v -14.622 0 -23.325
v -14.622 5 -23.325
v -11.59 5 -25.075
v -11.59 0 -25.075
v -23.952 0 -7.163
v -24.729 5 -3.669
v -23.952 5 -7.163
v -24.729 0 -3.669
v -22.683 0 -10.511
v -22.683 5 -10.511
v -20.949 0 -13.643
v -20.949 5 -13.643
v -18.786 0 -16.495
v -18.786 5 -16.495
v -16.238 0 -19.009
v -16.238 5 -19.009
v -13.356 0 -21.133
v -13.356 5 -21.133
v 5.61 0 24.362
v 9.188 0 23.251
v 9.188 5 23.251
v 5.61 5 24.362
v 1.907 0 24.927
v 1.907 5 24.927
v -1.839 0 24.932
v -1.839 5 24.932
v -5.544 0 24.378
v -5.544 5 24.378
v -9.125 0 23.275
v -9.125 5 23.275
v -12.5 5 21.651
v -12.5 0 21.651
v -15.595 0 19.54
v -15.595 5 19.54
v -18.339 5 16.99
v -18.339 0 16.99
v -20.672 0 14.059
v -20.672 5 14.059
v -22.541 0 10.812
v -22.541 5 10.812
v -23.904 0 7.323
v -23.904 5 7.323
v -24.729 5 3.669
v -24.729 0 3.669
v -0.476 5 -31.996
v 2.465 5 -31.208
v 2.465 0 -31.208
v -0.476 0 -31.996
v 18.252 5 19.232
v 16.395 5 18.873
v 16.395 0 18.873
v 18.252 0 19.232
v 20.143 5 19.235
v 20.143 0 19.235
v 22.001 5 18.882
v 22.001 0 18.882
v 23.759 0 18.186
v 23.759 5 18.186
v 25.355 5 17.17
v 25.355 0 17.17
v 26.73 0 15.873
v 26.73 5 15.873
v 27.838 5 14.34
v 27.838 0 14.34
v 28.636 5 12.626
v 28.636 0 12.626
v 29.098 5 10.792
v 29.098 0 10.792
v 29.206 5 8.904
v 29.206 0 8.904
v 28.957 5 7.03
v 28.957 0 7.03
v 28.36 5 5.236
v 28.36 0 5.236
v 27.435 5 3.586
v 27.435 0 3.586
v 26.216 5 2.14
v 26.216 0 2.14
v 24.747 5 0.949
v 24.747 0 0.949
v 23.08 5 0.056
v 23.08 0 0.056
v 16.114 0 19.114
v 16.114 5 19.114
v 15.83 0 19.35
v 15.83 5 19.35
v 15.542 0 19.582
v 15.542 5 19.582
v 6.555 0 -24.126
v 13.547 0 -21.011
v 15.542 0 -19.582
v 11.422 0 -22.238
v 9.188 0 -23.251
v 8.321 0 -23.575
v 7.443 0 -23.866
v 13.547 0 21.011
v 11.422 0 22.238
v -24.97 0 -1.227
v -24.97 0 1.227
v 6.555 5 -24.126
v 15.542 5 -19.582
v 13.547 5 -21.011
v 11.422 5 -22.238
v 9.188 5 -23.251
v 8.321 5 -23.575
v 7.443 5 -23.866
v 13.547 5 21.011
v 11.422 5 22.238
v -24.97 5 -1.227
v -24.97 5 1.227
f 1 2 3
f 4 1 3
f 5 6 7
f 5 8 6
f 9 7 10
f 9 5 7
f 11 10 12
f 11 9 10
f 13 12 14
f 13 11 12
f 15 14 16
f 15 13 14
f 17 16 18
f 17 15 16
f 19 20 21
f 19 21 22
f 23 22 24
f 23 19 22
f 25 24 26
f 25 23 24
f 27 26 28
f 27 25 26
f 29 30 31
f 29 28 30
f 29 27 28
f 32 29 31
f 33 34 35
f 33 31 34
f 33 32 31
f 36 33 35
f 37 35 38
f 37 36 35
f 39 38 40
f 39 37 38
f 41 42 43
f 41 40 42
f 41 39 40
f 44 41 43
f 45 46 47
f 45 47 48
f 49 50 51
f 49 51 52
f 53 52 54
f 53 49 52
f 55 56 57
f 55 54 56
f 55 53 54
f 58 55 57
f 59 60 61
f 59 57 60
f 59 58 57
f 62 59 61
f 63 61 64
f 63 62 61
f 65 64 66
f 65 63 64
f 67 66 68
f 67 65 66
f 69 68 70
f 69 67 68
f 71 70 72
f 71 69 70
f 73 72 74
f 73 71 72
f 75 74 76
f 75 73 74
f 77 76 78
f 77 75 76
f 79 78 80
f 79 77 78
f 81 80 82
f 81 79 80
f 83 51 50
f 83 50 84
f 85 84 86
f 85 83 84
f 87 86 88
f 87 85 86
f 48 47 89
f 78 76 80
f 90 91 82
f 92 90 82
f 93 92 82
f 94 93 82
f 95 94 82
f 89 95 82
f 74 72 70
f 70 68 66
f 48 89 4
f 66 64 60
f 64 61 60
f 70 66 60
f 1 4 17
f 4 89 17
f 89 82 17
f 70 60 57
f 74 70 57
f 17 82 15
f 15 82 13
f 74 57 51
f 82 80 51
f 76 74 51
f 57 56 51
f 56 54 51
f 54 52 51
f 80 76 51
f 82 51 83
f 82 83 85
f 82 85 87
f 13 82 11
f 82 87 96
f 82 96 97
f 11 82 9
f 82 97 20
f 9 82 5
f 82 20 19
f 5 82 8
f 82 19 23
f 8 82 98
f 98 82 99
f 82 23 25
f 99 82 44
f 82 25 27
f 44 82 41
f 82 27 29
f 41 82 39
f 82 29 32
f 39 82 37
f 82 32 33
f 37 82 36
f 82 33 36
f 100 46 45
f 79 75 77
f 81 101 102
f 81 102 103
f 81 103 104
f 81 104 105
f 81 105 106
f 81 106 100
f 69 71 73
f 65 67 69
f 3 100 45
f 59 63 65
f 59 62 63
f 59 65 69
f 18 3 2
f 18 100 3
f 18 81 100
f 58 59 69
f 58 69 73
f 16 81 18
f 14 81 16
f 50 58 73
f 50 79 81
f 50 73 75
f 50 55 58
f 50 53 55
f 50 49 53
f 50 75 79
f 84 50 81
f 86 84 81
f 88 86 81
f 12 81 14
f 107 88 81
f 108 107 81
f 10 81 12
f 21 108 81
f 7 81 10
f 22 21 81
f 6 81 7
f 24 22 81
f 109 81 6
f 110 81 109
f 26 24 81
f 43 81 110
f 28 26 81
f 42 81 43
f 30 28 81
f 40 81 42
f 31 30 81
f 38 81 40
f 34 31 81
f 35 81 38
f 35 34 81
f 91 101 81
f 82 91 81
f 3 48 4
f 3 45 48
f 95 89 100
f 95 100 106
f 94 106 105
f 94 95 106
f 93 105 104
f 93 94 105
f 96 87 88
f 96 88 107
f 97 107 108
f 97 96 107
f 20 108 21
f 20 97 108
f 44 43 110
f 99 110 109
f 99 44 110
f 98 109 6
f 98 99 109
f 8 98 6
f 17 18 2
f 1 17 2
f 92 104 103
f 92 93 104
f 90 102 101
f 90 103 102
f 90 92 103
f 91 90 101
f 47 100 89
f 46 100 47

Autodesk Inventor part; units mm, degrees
ref_plane "YZ Plane" through (0, 0, 0) normal (1, 0, 0) x (0, 1, 0)
ref_plane "XZ Plane" through (0, 0, 0) normal (0, 1, 0) x (-1, 0, 0)
ref_plane "XY Plane" through (0, 0, 0) normal (0, 0, 1) x (1, 0, 0)
sketch "Sketch9" plane through (0, 0, 0) normal (0, 1, 0) x (-1, 0, 0)
  arc A0 (-15.5418, 19.582) -> (-15.5418, -19.582) centre (0, 0) ccw
  arc A1 (-9.1876, -23.2506) -> (24.7294, -3.6686) centre (0, 0) ccw
  arc A2 (24.7294, 3.6686) -> (-9.1876, 23.2506) centre (0, 0) ccw
  circle A3 centre (0, 0) radius 25
  point P0 (-15.5418, -19.582)
  point P1 (-9.1876, -23.2506)
  point P2 (24.7294, -3.6686)
  point P3 (24.7294, 3.6686)
  point P4 (-15.5418, 19.582)
  dimension "d222" = 25
  dimension "d223" = 25
  dimension "d224" = 25
extrude "Extrusion4" add sketch "Sketch9" along normal blind 5
sketch "Sketch17" plane through (0, 5, 0) normal (0, 1, 0) x (1, 0, 0)
  arc A0 (15.5418, -19.582) -> (15.5418, 19.582) centre (0, 0) ccw projected
  line L0 (15.5418, 19.582) -> (24.6527, -4.1527)
  arc A1 (24.6527, -4.1527) -> (15.5418, 19.582) centre (0, 0) ccw
  line L1 (39.1744, 0) -> (-46.6954, 0) construction
  dimension "d244" = 69
extrude "Extrusion8" cut sketch "Sketch17" against normal through all
sketch "Sketch38" plane through (0, 5, 0) normal (0, 1, 0) x (1, 0, 0)
  line L0 (2.4652, 31.2084) -> (-0.476, 31.9965) projected
  line L1 (-0.476, 31.9965) -> (-11.5905, 25.0753)
  line L2 (8.3534, 21.0097) -> (2.4652, 31.2084) projected
  line L3 (-0.476, 31.9965) -> (2.4652, 31.2084)
  circle A0 centre (0, 0) radius 25 projected
  line L4 (2.4652, 31.2084) -> (6.5546, 24.1255)
  arc A1 (6.2227, 24.2132) -> (14.6024, -20.2921) centre (0, 0) ccw
  line L5 (-11.0461, 17.1324) -> (-13.356, 21.1333) projected
  line L6 (-13.356, 21.1333) -> (-14.6216, 23.3253)
  line L7 (-14.6216, 23.3253) -> (-11.5905, 25.0753)
  line L8 (-13.356, 21.1333) -> (-6.4888, 10.7302)
  line L9 (-6.4888, 10.7302) -> (6.2227, 24.2132)
  point P0 (3.9242, 24.6901)
  point P1 (-24.7294, 3.6686)
  point P2 (9.1876, 23.2506)
  point P3 (8.9539, -17.5087)
  point P4 (6.5546, 24.1255)
extrude "Extrusion24" add sketch "Sketch38" against normal blind 5 contours L2 A0 L6 L7 L1 L0
sketch "Sketch43" plane through (0, 5, 0) normal (0, 1, 0) x (1, 0, 0)
  circle A0 centre (19.2133, -9.2784) radius 10
  arc A1 (12.0096, -16.2143) -> (26.417, -2.3425) centre (19.2133, -9.2784) ccw projected
  point P0 (0, 0)
  dimension "d385" = 20
extrude "Extrusion28" add sketch "Sketch43" against normal blind 5
properties part number "Electronic base"
